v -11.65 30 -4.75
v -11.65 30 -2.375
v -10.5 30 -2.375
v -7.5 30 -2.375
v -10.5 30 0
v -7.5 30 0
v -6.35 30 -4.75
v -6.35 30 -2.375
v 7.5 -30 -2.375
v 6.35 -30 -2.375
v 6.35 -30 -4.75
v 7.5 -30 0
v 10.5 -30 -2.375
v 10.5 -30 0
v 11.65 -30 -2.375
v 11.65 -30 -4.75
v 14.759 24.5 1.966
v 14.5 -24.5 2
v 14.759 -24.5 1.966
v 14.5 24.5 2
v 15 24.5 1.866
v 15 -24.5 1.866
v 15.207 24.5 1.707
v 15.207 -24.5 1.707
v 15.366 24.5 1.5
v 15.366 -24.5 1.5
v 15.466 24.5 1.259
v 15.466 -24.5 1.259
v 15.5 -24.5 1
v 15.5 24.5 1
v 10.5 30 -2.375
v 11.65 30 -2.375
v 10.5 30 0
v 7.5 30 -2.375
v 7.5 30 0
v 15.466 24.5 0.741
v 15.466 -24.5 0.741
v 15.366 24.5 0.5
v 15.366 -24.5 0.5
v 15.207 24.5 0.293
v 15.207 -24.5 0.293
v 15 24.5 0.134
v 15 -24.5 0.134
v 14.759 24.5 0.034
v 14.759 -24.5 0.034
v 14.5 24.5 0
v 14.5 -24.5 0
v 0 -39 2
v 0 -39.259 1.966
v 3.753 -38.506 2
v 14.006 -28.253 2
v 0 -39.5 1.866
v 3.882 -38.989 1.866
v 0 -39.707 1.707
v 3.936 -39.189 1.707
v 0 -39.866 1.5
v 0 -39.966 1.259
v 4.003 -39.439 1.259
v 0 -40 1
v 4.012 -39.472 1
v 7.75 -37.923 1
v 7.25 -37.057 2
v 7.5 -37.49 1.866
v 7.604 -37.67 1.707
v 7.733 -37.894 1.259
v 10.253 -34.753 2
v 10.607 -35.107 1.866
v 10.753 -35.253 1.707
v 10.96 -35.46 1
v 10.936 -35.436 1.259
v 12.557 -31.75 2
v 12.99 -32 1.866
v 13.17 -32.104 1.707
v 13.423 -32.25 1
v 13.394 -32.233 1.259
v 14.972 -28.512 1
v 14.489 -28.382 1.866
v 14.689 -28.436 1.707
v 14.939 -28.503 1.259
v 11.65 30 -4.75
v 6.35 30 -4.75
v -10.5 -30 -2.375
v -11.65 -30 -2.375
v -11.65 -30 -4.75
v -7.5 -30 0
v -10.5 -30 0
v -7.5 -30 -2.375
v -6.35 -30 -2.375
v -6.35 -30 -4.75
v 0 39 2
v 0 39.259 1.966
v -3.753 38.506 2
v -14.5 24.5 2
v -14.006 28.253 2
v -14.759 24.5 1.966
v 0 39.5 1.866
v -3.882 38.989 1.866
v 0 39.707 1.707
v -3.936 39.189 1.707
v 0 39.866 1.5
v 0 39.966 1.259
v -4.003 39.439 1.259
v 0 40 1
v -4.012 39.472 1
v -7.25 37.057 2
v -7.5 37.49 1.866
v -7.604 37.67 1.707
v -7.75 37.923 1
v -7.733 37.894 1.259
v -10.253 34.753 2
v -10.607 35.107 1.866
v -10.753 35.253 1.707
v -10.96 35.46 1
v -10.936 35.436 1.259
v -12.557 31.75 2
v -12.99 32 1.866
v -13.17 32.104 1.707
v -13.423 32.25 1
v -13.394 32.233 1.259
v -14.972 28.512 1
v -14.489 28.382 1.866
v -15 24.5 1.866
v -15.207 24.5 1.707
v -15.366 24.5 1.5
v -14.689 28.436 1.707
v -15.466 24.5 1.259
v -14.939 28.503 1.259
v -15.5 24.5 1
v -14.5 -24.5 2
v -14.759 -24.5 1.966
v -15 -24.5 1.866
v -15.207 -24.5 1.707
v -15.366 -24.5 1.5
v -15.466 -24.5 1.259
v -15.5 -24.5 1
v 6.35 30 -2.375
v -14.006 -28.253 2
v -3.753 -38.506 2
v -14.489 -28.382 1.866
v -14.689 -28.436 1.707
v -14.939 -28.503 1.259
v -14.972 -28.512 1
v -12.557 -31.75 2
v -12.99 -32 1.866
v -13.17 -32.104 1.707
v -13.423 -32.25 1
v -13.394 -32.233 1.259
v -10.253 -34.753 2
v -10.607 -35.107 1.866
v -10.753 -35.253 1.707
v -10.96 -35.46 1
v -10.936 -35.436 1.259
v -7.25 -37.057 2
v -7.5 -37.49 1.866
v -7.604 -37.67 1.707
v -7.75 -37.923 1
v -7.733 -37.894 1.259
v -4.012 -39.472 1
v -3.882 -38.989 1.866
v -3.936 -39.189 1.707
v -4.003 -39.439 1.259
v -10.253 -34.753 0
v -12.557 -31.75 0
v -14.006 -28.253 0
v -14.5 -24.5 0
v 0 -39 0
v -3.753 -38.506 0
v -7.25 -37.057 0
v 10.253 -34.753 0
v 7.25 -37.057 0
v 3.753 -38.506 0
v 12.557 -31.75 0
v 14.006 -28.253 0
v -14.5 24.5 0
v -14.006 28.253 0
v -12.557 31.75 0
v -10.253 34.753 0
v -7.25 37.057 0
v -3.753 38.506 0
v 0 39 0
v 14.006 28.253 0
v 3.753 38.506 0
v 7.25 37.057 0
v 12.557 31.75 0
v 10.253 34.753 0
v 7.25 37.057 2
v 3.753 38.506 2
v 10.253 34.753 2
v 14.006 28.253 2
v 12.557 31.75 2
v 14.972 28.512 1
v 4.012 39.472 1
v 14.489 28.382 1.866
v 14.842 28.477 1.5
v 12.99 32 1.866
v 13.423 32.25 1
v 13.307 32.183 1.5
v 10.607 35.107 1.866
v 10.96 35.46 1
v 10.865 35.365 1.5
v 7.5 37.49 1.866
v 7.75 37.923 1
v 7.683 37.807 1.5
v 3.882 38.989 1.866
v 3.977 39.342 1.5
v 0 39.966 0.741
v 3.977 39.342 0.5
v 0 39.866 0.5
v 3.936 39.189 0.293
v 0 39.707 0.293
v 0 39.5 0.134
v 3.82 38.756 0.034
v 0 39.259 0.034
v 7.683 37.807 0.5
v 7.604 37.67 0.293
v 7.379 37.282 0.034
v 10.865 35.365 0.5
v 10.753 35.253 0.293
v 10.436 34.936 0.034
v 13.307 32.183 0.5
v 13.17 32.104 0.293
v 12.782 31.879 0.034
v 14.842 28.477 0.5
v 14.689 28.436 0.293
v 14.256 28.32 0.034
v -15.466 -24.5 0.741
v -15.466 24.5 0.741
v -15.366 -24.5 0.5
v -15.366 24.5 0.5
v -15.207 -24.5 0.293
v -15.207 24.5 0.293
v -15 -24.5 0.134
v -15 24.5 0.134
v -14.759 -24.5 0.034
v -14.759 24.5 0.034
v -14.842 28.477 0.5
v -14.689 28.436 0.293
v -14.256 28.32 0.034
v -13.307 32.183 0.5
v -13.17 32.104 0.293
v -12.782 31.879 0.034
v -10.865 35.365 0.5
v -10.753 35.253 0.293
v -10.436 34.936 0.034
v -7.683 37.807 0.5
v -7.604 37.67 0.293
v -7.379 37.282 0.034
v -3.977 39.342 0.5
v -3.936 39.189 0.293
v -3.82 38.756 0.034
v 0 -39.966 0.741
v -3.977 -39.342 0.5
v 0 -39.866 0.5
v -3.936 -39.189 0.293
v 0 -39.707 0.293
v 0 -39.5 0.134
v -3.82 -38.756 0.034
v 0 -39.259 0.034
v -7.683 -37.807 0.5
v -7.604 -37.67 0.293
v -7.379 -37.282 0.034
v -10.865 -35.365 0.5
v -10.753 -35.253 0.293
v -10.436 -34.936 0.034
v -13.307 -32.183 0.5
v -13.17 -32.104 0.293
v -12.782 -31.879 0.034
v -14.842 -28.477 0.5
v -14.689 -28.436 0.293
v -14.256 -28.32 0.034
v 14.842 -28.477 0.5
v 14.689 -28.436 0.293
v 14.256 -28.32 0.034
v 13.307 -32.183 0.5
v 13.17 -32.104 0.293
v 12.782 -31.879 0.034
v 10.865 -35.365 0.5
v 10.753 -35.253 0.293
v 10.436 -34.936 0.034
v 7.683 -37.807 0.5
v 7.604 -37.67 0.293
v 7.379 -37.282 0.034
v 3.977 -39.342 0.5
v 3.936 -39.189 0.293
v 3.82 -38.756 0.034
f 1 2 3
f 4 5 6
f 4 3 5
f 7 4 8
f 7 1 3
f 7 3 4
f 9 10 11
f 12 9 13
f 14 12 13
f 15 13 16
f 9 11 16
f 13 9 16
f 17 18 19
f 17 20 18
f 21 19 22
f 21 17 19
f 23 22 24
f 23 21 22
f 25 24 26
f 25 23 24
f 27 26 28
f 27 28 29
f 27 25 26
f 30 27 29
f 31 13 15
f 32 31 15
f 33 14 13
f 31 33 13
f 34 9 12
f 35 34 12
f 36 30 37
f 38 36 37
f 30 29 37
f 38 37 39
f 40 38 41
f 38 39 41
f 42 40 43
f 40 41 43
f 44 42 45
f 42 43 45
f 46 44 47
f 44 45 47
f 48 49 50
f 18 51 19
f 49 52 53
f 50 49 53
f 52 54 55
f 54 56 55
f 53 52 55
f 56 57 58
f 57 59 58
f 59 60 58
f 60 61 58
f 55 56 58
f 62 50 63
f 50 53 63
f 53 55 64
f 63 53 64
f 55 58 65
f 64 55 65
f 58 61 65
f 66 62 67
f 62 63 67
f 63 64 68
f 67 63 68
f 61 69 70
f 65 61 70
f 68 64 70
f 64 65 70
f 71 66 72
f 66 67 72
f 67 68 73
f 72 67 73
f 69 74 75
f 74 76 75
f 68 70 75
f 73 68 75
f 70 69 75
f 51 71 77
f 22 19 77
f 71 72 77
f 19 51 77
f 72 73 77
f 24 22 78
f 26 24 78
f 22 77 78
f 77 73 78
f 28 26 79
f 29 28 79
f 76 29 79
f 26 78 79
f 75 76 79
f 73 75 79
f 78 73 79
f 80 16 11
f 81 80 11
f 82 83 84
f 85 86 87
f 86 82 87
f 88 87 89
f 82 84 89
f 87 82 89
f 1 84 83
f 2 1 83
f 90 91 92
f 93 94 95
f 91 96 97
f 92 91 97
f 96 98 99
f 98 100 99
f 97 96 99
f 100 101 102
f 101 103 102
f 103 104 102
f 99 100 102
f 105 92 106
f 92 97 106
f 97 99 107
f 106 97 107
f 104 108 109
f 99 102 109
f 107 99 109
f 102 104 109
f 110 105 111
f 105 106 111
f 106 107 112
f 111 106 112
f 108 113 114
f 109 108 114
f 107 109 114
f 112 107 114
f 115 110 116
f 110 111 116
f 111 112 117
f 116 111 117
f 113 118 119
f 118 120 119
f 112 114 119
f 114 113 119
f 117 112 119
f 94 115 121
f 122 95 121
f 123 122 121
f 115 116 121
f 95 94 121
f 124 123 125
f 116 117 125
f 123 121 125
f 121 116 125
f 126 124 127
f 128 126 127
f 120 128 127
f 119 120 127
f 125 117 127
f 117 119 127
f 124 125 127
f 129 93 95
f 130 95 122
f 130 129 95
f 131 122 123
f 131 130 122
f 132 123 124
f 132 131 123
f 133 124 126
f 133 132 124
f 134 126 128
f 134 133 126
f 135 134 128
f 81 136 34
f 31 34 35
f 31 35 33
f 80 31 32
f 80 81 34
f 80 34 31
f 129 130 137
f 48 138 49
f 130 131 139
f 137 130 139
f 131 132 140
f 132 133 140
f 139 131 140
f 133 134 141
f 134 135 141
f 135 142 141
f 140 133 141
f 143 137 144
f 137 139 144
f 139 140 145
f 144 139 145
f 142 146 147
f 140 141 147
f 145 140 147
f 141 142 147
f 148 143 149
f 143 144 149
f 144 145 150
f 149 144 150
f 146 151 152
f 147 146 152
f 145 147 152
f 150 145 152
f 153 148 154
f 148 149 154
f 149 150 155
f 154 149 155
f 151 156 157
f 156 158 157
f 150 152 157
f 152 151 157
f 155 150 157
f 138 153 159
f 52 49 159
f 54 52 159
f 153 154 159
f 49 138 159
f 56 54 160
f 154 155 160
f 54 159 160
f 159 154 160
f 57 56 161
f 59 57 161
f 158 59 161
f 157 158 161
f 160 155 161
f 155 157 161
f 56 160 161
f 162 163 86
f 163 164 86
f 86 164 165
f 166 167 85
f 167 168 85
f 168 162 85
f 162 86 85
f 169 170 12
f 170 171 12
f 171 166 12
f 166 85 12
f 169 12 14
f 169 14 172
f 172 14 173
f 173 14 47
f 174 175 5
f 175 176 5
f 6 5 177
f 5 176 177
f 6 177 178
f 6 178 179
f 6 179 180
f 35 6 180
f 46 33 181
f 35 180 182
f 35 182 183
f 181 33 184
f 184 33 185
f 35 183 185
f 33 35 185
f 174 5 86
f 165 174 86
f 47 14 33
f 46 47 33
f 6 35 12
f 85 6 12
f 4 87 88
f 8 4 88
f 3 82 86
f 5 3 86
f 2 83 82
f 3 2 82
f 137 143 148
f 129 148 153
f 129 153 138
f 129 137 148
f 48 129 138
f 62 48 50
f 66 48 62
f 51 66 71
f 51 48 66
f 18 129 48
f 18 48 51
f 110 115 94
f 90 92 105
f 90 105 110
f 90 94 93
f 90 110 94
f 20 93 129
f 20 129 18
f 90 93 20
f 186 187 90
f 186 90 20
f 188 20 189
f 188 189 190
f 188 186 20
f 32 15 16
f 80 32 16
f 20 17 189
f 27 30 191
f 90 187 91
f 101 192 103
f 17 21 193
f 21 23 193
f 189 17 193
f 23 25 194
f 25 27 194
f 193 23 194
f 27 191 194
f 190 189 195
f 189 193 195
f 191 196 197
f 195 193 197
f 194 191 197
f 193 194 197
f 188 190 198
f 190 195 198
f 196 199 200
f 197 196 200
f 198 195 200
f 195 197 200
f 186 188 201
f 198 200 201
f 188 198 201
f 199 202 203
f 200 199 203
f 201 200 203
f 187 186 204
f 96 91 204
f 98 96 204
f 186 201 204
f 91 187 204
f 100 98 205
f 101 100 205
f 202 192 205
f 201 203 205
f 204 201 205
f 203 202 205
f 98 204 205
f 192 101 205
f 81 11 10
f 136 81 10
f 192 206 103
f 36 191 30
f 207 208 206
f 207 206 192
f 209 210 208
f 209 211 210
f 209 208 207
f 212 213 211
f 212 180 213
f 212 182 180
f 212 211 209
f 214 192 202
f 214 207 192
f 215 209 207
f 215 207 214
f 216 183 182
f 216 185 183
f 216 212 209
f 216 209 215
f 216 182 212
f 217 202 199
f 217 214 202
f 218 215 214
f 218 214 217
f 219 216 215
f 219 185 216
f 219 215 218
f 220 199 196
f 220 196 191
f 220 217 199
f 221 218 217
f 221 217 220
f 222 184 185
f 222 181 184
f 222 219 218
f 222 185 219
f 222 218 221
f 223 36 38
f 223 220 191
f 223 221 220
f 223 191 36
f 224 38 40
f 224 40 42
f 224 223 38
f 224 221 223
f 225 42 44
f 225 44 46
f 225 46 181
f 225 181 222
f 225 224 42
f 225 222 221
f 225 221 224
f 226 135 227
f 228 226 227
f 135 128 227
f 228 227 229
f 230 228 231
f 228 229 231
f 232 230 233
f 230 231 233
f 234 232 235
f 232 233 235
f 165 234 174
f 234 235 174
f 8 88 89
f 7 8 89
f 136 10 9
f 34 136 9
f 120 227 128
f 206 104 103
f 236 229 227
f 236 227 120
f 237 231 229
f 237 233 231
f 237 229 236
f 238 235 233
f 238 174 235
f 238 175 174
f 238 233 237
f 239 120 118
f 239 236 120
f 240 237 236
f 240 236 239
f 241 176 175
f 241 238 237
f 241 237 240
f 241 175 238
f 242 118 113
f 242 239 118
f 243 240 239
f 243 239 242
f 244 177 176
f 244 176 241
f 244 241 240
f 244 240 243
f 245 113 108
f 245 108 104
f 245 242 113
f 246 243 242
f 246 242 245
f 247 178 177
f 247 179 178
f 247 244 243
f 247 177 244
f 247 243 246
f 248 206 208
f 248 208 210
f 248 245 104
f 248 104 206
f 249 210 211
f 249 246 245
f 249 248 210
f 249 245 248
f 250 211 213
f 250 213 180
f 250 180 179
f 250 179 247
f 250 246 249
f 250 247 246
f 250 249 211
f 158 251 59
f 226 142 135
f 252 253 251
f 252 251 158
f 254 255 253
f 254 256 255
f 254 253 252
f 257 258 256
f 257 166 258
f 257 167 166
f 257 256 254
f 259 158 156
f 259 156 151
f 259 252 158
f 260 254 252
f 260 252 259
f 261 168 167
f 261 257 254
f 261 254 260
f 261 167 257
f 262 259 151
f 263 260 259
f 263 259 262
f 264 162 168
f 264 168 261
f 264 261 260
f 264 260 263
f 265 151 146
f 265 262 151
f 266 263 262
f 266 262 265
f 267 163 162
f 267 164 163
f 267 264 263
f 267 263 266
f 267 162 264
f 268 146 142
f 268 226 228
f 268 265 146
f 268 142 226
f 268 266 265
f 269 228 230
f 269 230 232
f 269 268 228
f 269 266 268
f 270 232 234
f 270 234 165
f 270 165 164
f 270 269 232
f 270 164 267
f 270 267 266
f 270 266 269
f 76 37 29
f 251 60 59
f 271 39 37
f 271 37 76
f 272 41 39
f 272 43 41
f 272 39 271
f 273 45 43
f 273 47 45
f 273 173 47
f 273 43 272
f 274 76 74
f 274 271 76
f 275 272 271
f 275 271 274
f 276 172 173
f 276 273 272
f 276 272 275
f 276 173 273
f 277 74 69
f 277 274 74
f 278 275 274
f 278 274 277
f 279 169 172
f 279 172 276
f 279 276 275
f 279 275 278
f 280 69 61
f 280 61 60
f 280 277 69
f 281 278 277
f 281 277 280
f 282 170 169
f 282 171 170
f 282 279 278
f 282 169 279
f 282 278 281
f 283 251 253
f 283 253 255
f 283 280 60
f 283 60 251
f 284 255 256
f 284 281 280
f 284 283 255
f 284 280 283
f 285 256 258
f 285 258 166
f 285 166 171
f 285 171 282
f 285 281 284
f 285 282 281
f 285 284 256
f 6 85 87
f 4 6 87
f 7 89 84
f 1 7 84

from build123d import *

# Parameters (mm, degrees)
SKETCH1_W                = 31
SKETCH1_H                = 80
BOSS_EXTRUDE1_DEPTH      = 2
FILLET1_R                = 15.5
BOSS_EXTRUDE2_DEPTH      = 30
BOSS_EXTRUDE2_DEPTH_BACK = 30
FILLET3_R                = 1


with BuildPart() as part:
    # Sketch1 → Boss-Extrude1 (new body)
    with BuildSketch(Plane.XY):
        Rectangle(SKETCH1_W, SKETCH1_H)
    extrude(amount=BOSS_EXTRUDE1_DEPTH)

    # Fillet1
    fillet1_edges = [part.edges().sort_by_distance(p)[0] for p in [
        (-15.5, 40, 1),
        (15.5, -40, 1),
        (-15.5, -40, 1),
        (15.5, 40, 1),
    ]]
    fillet(fillet1_edges, radius=FILLET1_R - 0.0001)  # a hair under: the kernel refuses the full size

    # Sketch2 → Boss-Extrude2 (add, two sides: drawn at the far end of the back side and taken through both)
    with BuildSketch(Plane(origin=(0, 0, 0), x_dir=(1, 0, 0), z_dir=(0, 1, 0)).offset(-BOSS_EXTRUDE2_DEPTH_BACK)):
        Polygon((-10.5, 0), (-7.5, 0), (-7.5, 2.375), (-6.35, 2.375), (-6.35, 4.75), (-7.5, 4.75), (-10.5, 4.75), (-11.65, 4.75), (-11.65, 2.375), (-10.5, 2.375), align=None)
        Polygon((10.5, 0), (10.5, 2.375), (11.65, 2.375), (11.65, 4.75), (6.35, 4.75), (6.35, 2.375), (7.5, 2.375), (7.5, 0), align=None)
    extrude(amount=BOSS_EXTRUDE2_DEPTH + BOSS_EXTRUDE2_DEPTH_BACK)

    # Fillet3
    fillet3_edges = [part.edges().sort_by_distance(p)[0] for p in [
        (-15.5, 0, 0),
        (-10.960184398, -35.460184398, 0),
        (10.960184398, -35.460184398, 0),
        (15.5, 0, 0),
        (10.960184398, 35.460184398, 0),
        (10.960184398, 35.460184398, 2),
        (15.5, 0, 2),
        (10.960184398, -35.460184398, 2),
        (-10.960184398, -35.460184398, 2),
        (-15.5, 0, 2),
        (-10.960184398, 35.460184398, 0),
        (-10.960184398, 35.460184398, 2),
    ]]
    fillet(fillet3_edges, radius=FILLET3_R - 0.0001)  # a hair under: the kernel refuses the full size


solid = part.part
